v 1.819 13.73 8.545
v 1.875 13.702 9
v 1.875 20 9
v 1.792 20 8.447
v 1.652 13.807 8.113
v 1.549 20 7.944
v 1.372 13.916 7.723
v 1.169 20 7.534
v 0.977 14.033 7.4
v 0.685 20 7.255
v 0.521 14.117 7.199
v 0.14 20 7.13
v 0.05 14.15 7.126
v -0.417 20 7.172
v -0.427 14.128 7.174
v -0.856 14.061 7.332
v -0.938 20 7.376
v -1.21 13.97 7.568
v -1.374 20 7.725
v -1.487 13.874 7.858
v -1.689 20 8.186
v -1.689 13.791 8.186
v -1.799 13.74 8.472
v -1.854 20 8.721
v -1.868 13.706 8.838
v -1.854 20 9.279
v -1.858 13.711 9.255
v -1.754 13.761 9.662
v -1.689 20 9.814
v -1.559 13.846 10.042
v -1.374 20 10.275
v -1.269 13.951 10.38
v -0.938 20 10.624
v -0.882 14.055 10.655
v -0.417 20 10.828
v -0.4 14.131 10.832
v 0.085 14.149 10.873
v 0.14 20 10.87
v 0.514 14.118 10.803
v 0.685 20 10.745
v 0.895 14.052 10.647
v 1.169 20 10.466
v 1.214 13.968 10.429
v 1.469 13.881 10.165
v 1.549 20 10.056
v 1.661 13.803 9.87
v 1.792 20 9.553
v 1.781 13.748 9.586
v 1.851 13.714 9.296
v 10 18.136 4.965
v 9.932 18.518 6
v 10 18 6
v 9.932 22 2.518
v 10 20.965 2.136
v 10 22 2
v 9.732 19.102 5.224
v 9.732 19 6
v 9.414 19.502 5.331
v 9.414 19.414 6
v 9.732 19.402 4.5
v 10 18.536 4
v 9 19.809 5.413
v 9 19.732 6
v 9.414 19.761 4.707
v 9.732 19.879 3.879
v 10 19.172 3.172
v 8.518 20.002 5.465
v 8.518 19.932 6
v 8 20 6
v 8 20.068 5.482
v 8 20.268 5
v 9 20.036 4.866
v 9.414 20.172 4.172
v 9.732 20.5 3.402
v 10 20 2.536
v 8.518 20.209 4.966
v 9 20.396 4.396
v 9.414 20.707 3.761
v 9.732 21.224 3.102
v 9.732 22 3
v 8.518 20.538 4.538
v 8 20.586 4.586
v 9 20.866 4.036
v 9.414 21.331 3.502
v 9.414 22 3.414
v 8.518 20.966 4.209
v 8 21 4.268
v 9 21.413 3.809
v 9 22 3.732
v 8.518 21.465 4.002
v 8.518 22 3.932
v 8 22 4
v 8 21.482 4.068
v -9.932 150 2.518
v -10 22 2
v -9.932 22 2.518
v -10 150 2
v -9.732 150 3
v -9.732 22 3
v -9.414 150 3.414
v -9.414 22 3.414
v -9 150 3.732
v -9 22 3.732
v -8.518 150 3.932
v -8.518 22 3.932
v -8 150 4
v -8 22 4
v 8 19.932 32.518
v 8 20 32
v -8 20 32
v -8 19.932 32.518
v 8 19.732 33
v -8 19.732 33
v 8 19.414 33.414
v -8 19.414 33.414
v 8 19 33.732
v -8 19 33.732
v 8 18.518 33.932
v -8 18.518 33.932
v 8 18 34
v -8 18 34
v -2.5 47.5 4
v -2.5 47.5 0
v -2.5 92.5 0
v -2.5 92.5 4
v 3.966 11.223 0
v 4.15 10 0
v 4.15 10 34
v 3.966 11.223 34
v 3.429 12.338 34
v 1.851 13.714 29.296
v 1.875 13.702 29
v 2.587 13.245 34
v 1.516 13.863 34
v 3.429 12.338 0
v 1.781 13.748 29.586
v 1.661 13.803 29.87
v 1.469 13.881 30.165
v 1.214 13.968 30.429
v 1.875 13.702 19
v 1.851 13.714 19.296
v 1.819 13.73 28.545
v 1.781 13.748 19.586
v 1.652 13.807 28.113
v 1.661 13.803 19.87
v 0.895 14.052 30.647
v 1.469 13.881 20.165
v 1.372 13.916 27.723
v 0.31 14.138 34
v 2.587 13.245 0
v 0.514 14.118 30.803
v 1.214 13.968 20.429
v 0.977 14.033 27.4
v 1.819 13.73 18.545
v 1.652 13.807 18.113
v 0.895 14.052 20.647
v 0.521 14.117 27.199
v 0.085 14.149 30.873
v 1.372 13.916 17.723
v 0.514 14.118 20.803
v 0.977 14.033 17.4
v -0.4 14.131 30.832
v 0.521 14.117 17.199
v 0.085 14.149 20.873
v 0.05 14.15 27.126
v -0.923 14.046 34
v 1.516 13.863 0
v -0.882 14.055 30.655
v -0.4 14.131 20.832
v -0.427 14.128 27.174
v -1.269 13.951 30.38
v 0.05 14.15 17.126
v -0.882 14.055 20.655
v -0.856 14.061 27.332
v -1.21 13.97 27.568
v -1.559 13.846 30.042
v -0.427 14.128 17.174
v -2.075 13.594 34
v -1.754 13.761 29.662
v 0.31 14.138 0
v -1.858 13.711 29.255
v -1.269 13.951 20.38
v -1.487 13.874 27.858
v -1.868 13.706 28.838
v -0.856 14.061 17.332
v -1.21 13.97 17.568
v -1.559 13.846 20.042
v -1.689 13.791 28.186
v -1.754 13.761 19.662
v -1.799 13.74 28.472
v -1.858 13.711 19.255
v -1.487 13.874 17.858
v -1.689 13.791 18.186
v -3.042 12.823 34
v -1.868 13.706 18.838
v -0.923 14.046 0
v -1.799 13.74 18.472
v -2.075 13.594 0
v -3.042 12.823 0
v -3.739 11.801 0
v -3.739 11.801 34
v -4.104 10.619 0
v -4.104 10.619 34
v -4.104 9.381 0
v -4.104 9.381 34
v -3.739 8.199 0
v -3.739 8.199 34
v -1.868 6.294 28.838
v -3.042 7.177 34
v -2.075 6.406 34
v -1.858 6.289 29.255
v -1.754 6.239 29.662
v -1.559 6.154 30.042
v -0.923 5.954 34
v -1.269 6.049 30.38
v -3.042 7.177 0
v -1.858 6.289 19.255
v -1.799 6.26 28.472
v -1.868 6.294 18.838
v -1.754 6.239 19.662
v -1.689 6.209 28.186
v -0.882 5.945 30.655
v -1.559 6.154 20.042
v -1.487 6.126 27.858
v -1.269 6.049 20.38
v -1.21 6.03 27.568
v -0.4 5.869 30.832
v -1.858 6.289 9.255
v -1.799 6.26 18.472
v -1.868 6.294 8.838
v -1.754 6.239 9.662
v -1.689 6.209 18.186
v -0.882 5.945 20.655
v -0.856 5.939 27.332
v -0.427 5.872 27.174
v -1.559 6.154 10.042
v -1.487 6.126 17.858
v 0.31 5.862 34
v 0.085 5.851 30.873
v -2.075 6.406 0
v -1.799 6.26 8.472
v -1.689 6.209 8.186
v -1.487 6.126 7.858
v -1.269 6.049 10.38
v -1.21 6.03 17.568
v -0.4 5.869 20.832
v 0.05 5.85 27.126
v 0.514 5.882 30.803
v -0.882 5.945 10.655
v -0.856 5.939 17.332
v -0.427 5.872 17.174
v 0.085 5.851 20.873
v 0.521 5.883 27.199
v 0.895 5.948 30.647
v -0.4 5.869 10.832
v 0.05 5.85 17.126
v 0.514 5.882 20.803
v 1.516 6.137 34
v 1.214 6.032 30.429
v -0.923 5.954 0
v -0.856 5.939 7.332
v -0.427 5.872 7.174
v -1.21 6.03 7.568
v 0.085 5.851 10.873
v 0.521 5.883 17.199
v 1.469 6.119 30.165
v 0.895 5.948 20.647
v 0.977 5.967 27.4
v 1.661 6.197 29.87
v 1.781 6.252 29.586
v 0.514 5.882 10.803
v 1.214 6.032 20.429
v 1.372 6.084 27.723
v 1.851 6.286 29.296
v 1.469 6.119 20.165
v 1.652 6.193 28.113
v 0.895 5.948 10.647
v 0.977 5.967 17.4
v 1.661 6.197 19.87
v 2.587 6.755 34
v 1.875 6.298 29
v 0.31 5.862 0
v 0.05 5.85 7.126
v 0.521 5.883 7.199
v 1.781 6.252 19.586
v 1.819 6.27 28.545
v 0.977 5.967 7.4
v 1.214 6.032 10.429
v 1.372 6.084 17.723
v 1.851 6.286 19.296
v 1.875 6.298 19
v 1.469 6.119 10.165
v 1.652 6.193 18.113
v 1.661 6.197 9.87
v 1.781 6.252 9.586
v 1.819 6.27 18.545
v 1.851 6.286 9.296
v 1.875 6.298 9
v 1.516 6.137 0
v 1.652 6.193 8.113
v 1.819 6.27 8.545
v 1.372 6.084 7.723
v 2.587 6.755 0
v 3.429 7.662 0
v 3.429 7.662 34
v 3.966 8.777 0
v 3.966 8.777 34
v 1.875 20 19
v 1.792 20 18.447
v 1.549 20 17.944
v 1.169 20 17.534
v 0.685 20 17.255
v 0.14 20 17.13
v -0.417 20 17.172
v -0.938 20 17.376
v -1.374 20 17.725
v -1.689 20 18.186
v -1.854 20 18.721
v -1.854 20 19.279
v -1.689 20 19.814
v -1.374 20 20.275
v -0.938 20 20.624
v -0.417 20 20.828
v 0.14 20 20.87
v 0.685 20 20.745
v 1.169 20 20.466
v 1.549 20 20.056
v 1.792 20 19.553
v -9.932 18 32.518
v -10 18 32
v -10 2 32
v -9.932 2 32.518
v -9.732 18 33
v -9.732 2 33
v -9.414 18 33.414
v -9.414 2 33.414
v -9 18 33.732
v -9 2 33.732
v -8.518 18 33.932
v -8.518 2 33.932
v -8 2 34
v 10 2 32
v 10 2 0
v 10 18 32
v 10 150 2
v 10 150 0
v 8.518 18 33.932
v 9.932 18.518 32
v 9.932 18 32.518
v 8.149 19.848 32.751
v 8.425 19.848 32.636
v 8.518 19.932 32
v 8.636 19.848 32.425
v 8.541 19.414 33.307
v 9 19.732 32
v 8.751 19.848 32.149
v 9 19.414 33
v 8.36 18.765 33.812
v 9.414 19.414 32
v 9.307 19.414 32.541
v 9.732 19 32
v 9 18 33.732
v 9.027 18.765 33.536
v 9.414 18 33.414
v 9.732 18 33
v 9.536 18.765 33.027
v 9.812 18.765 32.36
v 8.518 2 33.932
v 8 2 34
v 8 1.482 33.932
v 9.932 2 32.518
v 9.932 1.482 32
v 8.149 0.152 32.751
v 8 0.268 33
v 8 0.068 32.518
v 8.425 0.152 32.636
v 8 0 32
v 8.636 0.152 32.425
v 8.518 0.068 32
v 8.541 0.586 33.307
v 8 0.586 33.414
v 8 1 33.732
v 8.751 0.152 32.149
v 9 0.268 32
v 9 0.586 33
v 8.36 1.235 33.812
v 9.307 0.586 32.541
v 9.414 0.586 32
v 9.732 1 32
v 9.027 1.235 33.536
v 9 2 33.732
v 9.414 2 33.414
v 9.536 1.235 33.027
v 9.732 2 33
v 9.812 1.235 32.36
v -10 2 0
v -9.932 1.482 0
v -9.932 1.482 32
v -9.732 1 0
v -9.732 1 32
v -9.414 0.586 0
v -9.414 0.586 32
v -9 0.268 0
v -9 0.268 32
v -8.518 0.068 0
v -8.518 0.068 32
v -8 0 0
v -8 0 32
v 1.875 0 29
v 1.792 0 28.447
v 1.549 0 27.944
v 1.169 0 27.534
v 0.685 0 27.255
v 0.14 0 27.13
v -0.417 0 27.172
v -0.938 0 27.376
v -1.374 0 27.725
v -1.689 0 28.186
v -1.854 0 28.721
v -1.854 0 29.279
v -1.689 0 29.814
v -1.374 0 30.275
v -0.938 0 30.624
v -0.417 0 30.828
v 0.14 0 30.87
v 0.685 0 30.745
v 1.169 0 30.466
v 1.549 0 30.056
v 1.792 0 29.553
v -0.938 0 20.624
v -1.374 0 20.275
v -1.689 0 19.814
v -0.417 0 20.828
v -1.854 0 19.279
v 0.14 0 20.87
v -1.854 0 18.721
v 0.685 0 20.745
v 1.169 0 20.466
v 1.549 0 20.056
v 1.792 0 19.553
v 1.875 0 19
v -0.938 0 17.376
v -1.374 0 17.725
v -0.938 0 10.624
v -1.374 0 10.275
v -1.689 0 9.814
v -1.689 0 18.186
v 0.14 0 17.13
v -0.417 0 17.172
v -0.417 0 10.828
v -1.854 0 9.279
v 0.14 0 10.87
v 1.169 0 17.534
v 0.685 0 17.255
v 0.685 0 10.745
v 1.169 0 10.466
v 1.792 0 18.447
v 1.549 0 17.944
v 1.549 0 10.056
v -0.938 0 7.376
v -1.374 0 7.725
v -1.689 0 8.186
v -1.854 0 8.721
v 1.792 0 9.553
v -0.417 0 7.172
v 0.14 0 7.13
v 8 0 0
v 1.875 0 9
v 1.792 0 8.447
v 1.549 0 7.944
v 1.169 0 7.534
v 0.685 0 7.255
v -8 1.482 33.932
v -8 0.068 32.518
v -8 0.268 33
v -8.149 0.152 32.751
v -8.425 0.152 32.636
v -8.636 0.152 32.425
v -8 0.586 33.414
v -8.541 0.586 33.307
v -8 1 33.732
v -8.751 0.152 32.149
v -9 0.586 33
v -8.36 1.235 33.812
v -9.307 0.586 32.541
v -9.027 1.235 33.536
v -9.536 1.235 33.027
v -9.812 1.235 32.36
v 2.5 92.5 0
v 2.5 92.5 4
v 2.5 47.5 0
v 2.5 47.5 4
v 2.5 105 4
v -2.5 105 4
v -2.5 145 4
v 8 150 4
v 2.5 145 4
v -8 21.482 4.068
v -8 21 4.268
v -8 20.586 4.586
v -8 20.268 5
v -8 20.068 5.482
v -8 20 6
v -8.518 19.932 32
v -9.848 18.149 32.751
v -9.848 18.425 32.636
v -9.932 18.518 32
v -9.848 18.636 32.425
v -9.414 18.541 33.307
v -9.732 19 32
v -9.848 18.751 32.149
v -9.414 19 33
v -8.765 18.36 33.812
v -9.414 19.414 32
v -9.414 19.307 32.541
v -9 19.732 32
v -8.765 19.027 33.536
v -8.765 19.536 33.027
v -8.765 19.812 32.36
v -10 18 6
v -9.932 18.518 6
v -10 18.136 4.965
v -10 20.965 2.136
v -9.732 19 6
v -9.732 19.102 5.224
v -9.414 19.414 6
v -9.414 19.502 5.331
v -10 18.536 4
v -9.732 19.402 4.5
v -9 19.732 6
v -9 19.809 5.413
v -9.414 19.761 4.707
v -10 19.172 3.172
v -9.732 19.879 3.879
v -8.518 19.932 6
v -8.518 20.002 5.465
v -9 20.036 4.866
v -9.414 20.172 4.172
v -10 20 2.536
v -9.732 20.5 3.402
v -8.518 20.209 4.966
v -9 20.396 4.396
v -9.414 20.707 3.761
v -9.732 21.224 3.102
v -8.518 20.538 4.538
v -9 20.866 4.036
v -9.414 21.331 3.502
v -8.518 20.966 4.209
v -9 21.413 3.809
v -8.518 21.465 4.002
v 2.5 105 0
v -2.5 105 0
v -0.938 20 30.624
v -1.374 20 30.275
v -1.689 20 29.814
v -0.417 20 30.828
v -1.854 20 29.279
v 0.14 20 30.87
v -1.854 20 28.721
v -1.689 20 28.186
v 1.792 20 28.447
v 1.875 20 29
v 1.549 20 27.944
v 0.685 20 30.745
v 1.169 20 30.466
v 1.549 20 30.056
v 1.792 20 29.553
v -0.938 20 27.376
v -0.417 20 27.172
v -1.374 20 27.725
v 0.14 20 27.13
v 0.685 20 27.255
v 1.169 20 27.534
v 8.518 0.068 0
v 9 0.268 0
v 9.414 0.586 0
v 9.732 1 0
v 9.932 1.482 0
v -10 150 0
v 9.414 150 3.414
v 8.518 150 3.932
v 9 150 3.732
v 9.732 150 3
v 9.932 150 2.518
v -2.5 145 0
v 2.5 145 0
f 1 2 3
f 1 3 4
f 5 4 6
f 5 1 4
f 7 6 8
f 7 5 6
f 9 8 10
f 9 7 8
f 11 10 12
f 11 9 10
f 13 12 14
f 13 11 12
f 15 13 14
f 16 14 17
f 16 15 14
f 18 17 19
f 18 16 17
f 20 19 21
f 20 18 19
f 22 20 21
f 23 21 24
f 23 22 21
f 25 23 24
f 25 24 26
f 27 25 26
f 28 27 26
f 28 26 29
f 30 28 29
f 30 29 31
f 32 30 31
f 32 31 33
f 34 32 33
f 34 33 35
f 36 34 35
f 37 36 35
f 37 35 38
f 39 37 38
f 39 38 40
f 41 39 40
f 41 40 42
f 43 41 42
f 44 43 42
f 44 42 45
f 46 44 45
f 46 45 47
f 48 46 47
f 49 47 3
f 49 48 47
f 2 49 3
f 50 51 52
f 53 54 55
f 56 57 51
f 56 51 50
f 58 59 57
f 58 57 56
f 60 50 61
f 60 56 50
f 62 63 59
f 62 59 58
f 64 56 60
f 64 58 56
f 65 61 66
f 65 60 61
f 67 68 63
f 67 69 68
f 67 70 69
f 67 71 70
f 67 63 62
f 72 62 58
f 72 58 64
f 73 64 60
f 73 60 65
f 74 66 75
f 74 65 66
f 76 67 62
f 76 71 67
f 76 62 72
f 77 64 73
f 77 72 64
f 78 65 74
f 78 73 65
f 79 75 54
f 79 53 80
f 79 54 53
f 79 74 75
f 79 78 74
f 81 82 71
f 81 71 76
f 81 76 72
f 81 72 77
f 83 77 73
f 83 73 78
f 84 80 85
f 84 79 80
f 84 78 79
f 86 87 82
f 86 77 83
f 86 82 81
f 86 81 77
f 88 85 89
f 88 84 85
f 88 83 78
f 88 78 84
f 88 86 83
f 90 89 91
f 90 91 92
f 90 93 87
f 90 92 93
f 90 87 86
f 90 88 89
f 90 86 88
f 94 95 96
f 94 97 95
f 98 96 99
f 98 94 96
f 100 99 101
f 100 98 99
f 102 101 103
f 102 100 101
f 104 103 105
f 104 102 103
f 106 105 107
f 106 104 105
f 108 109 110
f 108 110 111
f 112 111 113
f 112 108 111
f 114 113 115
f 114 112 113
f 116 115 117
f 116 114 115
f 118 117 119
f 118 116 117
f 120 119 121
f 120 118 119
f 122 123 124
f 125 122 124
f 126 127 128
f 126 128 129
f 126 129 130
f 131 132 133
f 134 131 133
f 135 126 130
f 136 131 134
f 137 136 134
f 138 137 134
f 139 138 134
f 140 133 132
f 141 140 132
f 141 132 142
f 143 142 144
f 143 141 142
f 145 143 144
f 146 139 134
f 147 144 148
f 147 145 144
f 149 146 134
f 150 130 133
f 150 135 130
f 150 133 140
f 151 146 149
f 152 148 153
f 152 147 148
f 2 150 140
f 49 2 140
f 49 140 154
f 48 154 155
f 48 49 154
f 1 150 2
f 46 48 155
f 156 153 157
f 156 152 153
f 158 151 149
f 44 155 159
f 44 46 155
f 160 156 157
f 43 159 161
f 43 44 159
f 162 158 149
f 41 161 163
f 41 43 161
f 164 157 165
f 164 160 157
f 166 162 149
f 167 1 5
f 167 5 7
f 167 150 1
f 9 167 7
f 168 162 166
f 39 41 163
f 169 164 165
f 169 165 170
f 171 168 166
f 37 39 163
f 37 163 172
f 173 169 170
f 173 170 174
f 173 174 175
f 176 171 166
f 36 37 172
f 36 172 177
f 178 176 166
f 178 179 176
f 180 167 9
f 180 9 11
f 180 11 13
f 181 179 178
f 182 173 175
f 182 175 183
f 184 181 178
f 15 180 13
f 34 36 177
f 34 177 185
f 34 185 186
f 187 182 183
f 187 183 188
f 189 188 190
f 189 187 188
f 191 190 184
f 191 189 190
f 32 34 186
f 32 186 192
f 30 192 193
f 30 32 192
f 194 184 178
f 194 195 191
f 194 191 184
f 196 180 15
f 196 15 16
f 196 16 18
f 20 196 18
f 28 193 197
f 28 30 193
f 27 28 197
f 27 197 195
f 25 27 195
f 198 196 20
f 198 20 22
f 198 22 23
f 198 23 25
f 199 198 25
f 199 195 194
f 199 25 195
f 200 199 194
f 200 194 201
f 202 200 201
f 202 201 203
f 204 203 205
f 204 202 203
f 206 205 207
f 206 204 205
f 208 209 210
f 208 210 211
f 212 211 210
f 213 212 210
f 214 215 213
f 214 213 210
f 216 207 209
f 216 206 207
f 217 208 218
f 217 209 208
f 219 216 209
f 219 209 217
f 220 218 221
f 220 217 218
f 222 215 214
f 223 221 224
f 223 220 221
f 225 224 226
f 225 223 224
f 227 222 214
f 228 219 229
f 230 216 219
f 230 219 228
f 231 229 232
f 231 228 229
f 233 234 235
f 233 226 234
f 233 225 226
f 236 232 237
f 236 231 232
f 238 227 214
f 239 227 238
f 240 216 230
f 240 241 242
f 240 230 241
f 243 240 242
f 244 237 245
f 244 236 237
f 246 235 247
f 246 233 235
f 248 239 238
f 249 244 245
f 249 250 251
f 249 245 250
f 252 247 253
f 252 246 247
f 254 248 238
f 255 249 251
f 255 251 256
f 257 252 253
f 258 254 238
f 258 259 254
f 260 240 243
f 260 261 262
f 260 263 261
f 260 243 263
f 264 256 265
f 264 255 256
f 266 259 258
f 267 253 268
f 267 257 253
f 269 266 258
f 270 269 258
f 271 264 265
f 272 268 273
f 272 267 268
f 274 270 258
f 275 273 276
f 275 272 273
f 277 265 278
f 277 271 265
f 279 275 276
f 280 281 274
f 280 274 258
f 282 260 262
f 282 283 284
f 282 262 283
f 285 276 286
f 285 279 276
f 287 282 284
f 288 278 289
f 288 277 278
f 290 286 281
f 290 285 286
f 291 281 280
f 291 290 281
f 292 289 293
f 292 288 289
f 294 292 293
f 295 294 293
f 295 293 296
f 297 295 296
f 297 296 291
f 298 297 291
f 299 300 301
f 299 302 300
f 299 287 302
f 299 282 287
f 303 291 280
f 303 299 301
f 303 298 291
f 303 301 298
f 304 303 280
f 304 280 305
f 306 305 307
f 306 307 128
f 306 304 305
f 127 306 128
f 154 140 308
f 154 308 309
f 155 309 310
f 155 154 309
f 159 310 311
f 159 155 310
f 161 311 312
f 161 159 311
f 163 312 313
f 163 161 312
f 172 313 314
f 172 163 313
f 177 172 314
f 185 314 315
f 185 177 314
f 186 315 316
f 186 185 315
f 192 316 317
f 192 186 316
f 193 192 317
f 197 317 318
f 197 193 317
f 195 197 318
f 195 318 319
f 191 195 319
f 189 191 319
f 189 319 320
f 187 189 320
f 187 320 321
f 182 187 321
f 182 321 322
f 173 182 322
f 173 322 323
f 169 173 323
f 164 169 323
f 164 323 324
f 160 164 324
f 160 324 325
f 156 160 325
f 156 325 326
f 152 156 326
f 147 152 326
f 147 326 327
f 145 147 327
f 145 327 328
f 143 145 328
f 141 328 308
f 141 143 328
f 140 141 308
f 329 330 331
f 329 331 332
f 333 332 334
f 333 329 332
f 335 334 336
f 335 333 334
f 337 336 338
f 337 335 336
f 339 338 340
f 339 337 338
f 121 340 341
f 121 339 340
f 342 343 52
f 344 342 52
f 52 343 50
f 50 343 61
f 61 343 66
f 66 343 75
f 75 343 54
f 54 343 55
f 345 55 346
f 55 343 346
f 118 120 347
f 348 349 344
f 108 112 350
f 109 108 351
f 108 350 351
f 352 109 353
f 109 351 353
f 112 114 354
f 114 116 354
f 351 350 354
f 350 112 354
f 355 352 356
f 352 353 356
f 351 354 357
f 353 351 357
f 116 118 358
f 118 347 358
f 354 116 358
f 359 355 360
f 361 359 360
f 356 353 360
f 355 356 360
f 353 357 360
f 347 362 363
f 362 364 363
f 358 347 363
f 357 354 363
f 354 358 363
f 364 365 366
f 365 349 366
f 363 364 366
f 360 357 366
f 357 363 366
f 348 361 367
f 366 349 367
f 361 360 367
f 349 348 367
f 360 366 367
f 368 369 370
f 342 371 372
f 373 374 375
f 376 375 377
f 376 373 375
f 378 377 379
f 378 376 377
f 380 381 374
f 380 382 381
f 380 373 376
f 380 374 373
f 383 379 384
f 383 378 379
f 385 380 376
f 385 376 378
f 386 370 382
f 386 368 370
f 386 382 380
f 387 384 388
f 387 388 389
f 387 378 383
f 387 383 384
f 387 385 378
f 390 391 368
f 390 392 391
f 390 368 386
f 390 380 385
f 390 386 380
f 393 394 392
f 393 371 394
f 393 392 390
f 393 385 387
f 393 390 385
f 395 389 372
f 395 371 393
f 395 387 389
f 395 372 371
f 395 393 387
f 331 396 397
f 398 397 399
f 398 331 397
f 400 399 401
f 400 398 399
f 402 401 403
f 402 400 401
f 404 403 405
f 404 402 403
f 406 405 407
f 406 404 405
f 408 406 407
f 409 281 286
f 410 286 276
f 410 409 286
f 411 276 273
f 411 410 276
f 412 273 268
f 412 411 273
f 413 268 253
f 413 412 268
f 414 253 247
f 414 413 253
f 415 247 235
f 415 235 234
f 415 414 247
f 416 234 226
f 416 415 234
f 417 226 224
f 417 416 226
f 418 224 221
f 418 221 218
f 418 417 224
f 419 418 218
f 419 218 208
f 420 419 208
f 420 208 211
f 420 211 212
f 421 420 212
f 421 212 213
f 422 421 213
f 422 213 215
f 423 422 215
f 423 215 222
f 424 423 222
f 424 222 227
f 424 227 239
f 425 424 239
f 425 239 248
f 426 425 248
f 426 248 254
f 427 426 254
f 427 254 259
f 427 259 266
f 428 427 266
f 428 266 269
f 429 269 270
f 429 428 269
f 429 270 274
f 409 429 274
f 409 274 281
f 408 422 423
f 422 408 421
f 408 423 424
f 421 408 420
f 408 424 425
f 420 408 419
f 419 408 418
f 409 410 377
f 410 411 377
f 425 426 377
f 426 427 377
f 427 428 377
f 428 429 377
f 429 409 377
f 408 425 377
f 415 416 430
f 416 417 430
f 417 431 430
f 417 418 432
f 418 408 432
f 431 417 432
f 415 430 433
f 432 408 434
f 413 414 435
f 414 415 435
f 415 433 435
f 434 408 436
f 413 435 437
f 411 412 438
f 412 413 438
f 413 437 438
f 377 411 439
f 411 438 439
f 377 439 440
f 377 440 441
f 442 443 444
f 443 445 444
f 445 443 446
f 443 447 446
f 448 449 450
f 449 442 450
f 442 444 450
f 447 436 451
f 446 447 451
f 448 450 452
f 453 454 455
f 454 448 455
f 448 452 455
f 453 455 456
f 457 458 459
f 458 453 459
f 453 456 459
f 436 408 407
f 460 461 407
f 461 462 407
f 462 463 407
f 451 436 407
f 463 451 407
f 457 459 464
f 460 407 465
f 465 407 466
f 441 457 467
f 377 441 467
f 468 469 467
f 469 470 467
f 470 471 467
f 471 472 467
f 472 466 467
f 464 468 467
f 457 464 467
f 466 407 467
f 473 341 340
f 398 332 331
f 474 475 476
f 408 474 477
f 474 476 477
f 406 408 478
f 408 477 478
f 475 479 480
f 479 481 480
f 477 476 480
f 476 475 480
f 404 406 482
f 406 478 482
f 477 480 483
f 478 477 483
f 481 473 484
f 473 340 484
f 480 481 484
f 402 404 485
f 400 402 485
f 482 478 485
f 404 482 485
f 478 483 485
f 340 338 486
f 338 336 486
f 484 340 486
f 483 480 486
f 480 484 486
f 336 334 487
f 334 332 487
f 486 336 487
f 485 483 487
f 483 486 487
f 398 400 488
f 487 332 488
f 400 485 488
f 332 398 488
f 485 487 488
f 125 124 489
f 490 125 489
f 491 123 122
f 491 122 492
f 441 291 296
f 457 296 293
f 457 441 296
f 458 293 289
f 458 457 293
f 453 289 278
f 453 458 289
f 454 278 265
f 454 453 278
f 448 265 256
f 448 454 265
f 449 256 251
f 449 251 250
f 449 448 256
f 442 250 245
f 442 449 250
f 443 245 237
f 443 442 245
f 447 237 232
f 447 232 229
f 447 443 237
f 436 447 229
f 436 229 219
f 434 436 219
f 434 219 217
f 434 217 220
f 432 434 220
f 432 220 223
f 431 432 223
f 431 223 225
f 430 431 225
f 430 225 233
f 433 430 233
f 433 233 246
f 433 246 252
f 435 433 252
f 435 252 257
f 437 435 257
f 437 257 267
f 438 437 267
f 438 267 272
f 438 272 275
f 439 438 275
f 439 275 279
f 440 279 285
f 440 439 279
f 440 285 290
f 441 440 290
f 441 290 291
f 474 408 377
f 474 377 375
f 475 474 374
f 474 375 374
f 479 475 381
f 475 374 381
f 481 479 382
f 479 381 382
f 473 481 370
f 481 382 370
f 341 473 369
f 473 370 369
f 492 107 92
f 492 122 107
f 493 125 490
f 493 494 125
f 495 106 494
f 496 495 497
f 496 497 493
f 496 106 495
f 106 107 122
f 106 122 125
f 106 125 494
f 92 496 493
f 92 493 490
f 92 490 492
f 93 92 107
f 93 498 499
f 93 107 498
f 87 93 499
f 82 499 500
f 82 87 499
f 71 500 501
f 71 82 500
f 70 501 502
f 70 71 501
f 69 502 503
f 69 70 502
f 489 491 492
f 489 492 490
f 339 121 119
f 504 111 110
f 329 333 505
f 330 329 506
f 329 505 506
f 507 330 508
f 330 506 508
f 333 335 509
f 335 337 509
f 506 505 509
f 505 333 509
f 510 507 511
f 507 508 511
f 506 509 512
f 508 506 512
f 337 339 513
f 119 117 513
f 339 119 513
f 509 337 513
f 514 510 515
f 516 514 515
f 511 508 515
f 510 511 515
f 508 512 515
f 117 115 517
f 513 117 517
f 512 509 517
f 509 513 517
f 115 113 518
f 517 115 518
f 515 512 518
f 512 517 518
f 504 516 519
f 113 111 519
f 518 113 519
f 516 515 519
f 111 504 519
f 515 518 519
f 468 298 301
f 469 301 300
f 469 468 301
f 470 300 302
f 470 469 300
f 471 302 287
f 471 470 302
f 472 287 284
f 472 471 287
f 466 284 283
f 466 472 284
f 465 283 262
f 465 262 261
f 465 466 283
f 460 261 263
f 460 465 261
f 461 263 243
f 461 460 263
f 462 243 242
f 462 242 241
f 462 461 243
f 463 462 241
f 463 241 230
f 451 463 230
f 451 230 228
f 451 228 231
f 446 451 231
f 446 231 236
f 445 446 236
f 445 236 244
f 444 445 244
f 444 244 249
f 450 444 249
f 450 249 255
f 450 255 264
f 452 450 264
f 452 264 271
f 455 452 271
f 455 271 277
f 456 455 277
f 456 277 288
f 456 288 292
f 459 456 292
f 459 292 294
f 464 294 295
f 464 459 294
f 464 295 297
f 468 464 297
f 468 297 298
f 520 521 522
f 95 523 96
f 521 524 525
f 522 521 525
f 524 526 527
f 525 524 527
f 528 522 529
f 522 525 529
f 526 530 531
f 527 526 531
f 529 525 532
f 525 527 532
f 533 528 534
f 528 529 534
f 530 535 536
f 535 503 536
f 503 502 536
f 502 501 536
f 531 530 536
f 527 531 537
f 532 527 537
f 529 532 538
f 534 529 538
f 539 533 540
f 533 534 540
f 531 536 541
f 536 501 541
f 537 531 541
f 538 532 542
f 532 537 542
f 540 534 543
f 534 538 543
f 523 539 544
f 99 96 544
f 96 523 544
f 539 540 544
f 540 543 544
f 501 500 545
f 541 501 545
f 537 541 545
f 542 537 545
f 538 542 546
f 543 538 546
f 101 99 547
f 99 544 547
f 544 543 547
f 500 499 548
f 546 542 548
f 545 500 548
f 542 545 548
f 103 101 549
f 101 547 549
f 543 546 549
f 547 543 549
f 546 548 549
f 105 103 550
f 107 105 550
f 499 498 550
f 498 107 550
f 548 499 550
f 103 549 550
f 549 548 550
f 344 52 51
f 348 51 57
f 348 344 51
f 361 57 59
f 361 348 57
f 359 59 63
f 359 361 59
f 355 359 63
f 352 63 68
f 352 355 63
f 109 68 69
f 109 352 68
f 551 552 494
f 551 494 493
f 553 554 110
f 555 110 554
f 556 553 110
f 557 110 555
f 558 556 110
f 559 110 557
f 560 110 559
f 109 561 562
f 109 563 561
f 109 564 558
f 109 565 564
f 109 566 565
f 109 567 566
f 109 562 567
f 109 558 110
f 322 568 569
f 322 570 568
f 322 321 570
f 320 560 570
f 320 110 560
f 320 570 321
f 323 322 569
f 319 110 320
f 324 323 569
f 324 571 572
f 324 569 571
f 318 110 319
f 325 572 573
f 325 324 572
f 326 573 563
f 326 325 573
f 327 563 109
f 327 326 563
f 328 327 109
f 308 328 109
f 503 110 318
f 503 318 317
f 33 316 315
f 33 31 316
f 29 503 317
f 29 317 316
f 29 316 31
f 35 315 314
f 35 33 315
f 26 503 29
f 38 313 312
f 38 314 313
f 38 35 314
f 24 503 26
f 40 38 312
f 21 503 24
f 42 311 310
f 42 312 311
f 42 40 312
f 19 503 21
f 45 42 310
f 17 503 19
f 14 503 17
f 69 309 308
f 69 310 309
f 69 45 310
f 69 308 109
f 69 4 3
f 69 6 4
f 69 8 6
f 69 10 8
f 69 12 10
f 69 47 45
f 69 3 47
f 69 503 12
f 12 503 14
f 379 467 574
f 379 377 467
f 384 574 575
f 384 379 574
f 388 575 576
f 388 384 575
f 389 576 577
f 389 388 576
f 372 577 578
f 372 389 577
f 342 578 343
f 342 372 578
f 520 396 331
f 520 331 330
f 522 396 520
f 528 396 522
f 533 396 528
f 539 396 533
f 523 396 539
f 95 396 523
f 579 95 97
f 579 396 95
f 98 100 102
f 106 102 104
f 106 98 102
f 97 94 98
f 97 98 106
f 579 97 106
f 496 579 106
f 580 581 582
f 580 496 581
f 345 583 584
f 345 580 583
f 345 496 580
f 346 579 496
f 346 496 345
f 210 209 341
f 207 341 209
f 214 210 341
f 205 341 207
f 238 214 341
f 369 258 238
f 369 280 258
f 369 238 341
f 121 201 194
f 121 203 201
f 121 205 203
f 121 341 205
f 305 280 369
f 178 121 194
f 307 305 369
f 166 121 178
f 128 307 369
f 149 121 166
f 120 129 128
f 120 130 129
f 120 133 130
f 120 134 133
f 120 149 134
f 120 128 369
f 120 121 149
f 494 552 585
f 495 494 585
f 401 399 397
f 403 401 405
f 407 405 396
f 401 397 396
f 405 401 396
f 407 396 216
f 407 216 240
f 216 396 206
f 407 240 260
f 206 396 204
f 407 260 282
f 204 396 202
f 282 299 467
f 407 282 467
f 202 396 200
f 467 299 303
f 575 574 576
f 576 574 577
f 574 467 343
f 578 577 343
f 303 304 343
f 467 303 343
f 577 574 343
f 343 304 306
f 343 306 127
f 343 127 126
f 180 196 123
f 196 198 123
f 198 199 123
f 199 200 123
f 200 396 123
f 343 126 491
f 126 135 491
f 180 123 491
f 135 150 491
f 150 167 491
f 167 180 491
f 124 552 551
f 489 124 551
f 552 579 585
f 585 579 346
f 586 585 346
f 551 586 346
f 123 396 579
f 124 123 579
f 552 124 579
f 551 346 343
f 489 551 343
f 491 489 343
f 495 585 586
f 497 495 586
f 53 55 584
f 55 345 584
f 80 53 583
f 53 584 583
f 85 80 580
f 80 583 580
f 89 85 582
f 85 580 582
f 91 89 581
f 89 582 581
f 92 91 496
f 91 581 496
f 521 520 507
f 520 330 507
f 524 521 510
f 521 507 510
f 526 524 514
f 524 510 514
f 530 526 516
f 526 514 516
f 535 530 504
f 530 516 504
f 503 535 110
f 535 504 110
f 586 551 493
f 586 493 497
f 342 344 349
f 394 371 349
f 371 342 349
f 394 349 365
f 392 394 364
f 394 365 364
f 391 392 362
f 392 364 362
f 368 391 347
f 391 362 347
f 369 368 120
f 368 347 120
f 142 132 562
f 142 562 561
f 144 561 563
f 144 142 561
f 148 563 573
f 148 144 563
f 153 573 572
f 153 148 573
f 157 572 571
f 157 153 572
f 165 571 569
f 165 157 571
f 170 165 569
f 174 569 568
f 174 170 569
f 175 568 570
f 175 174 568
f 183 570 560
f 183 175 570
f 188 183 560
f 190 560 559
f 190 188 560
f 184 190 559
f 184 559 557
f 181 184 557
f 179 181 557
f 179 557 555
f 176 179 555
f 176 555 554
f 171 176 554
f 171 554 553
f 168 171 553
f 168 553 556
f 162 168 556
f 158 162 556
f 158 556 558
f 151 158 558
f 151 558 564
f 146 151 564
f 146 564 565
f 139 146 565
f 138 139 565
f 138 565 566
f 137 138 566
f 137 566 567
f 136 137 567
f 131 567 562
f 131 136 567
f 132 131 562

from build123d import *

# Parameters (mm, degrees)
CROQUIS1_W              = 20
CROQUIS1_H              = 150
CROQUIS1_R              = 4.15
CROQUIS1_W_2            = 5
CROQUIS1_H_2            = 40
CROQUIS1_H_3            = 45
SALIENTE_EXTRUIR1_DEPTH = 4
SALIENTE_EXTRUIR2_START = 4
CROQUIS2_W              = 20
CROQUIS2_H              = 20
CROQUIS2_R              = 4.15
SALIENTE_EXTRUIR2_DEPTH = 30
REDONDEO1_R             = 2
CROQUIS3_R              = 1.875
CORTAR_EXTRUIR1_DEPTH   = 20


with BuildPart() as part:
    # Croquis1 → Saliente-Extruir1 (new body)
    with BuildSketch(Plane.XY):
        with Locations((0, 75)):
            Rectangle(CROQUIS1_W, CROQUIS1_H)
        with Locations((0, 10)):
            Circle(CROQUIS1_R, mode=Mode.SUBTRACT)
        with Locations((0, 125)):
            Rectangle(CROQUIS1_W_2, CROQUIS1_H_2, mode=Mode.SUBTRACT)
        with Locations((0, 70)):
            Rectangle(CROQUIS1_W_2, CROQUIS1_H_3, mode=Mode.SUBTRACT)
    extrude(amount=SALIENTE_EXTRUIR1_DEPTH)

    # Croquis2 → Saliente-Extruir2 (add)
    with BuildSketch(Plane.XY.offset(SALIENTE_EXTRUIR2_START)):
        with Locations((0, 10)):
            Rectangle(CROQUIS2_W, CROQUIS2_H)
        with Locations((0, 10)):
            Circle(CROQUIS2_R, mode=Mode.SUBTRACT)
    extrude(amount=SALIENTE_EXTRUIR2_DEPTH)

    # Redondeo1
    redondeo1_edges = [part.edges().sort_by_distance(p)[0] for p in [
        (-10, 85, 4),
        (10, 85, 4),
        (0, 20, 4),
        (10, 10, 34),
        (0, 20, 34),
        (10, 20, 19),
        (-10, 10, 34),
        (-10, 20, 19),
        (0, 0, 34),
        (10, 0, 17),
        (-10, 0, 17),
    ]]
    fillet(redondeo1_edges, radius=REDONDEO1_R)

    # Croquis3 → Cortar-Extruir1 (cut)
    with BuildSketch(Plane(origin=(0, 0, 0), x_dir=(1, 0, 0), z_dir=(0, 1, 0))):
        with Locations((0, -9)):
            Circle(CROQUIS3_R)
        with Locations((0, -29)):
            Circle(CROQUIS3_R)
        with Locations((0, -19)):
            Circle(CROQUIS3_R)
    extrude(amount=CORTAR_EXTRUIR1_DEPTH, mode=Mode.SUBTRACT)


solid = part.part
